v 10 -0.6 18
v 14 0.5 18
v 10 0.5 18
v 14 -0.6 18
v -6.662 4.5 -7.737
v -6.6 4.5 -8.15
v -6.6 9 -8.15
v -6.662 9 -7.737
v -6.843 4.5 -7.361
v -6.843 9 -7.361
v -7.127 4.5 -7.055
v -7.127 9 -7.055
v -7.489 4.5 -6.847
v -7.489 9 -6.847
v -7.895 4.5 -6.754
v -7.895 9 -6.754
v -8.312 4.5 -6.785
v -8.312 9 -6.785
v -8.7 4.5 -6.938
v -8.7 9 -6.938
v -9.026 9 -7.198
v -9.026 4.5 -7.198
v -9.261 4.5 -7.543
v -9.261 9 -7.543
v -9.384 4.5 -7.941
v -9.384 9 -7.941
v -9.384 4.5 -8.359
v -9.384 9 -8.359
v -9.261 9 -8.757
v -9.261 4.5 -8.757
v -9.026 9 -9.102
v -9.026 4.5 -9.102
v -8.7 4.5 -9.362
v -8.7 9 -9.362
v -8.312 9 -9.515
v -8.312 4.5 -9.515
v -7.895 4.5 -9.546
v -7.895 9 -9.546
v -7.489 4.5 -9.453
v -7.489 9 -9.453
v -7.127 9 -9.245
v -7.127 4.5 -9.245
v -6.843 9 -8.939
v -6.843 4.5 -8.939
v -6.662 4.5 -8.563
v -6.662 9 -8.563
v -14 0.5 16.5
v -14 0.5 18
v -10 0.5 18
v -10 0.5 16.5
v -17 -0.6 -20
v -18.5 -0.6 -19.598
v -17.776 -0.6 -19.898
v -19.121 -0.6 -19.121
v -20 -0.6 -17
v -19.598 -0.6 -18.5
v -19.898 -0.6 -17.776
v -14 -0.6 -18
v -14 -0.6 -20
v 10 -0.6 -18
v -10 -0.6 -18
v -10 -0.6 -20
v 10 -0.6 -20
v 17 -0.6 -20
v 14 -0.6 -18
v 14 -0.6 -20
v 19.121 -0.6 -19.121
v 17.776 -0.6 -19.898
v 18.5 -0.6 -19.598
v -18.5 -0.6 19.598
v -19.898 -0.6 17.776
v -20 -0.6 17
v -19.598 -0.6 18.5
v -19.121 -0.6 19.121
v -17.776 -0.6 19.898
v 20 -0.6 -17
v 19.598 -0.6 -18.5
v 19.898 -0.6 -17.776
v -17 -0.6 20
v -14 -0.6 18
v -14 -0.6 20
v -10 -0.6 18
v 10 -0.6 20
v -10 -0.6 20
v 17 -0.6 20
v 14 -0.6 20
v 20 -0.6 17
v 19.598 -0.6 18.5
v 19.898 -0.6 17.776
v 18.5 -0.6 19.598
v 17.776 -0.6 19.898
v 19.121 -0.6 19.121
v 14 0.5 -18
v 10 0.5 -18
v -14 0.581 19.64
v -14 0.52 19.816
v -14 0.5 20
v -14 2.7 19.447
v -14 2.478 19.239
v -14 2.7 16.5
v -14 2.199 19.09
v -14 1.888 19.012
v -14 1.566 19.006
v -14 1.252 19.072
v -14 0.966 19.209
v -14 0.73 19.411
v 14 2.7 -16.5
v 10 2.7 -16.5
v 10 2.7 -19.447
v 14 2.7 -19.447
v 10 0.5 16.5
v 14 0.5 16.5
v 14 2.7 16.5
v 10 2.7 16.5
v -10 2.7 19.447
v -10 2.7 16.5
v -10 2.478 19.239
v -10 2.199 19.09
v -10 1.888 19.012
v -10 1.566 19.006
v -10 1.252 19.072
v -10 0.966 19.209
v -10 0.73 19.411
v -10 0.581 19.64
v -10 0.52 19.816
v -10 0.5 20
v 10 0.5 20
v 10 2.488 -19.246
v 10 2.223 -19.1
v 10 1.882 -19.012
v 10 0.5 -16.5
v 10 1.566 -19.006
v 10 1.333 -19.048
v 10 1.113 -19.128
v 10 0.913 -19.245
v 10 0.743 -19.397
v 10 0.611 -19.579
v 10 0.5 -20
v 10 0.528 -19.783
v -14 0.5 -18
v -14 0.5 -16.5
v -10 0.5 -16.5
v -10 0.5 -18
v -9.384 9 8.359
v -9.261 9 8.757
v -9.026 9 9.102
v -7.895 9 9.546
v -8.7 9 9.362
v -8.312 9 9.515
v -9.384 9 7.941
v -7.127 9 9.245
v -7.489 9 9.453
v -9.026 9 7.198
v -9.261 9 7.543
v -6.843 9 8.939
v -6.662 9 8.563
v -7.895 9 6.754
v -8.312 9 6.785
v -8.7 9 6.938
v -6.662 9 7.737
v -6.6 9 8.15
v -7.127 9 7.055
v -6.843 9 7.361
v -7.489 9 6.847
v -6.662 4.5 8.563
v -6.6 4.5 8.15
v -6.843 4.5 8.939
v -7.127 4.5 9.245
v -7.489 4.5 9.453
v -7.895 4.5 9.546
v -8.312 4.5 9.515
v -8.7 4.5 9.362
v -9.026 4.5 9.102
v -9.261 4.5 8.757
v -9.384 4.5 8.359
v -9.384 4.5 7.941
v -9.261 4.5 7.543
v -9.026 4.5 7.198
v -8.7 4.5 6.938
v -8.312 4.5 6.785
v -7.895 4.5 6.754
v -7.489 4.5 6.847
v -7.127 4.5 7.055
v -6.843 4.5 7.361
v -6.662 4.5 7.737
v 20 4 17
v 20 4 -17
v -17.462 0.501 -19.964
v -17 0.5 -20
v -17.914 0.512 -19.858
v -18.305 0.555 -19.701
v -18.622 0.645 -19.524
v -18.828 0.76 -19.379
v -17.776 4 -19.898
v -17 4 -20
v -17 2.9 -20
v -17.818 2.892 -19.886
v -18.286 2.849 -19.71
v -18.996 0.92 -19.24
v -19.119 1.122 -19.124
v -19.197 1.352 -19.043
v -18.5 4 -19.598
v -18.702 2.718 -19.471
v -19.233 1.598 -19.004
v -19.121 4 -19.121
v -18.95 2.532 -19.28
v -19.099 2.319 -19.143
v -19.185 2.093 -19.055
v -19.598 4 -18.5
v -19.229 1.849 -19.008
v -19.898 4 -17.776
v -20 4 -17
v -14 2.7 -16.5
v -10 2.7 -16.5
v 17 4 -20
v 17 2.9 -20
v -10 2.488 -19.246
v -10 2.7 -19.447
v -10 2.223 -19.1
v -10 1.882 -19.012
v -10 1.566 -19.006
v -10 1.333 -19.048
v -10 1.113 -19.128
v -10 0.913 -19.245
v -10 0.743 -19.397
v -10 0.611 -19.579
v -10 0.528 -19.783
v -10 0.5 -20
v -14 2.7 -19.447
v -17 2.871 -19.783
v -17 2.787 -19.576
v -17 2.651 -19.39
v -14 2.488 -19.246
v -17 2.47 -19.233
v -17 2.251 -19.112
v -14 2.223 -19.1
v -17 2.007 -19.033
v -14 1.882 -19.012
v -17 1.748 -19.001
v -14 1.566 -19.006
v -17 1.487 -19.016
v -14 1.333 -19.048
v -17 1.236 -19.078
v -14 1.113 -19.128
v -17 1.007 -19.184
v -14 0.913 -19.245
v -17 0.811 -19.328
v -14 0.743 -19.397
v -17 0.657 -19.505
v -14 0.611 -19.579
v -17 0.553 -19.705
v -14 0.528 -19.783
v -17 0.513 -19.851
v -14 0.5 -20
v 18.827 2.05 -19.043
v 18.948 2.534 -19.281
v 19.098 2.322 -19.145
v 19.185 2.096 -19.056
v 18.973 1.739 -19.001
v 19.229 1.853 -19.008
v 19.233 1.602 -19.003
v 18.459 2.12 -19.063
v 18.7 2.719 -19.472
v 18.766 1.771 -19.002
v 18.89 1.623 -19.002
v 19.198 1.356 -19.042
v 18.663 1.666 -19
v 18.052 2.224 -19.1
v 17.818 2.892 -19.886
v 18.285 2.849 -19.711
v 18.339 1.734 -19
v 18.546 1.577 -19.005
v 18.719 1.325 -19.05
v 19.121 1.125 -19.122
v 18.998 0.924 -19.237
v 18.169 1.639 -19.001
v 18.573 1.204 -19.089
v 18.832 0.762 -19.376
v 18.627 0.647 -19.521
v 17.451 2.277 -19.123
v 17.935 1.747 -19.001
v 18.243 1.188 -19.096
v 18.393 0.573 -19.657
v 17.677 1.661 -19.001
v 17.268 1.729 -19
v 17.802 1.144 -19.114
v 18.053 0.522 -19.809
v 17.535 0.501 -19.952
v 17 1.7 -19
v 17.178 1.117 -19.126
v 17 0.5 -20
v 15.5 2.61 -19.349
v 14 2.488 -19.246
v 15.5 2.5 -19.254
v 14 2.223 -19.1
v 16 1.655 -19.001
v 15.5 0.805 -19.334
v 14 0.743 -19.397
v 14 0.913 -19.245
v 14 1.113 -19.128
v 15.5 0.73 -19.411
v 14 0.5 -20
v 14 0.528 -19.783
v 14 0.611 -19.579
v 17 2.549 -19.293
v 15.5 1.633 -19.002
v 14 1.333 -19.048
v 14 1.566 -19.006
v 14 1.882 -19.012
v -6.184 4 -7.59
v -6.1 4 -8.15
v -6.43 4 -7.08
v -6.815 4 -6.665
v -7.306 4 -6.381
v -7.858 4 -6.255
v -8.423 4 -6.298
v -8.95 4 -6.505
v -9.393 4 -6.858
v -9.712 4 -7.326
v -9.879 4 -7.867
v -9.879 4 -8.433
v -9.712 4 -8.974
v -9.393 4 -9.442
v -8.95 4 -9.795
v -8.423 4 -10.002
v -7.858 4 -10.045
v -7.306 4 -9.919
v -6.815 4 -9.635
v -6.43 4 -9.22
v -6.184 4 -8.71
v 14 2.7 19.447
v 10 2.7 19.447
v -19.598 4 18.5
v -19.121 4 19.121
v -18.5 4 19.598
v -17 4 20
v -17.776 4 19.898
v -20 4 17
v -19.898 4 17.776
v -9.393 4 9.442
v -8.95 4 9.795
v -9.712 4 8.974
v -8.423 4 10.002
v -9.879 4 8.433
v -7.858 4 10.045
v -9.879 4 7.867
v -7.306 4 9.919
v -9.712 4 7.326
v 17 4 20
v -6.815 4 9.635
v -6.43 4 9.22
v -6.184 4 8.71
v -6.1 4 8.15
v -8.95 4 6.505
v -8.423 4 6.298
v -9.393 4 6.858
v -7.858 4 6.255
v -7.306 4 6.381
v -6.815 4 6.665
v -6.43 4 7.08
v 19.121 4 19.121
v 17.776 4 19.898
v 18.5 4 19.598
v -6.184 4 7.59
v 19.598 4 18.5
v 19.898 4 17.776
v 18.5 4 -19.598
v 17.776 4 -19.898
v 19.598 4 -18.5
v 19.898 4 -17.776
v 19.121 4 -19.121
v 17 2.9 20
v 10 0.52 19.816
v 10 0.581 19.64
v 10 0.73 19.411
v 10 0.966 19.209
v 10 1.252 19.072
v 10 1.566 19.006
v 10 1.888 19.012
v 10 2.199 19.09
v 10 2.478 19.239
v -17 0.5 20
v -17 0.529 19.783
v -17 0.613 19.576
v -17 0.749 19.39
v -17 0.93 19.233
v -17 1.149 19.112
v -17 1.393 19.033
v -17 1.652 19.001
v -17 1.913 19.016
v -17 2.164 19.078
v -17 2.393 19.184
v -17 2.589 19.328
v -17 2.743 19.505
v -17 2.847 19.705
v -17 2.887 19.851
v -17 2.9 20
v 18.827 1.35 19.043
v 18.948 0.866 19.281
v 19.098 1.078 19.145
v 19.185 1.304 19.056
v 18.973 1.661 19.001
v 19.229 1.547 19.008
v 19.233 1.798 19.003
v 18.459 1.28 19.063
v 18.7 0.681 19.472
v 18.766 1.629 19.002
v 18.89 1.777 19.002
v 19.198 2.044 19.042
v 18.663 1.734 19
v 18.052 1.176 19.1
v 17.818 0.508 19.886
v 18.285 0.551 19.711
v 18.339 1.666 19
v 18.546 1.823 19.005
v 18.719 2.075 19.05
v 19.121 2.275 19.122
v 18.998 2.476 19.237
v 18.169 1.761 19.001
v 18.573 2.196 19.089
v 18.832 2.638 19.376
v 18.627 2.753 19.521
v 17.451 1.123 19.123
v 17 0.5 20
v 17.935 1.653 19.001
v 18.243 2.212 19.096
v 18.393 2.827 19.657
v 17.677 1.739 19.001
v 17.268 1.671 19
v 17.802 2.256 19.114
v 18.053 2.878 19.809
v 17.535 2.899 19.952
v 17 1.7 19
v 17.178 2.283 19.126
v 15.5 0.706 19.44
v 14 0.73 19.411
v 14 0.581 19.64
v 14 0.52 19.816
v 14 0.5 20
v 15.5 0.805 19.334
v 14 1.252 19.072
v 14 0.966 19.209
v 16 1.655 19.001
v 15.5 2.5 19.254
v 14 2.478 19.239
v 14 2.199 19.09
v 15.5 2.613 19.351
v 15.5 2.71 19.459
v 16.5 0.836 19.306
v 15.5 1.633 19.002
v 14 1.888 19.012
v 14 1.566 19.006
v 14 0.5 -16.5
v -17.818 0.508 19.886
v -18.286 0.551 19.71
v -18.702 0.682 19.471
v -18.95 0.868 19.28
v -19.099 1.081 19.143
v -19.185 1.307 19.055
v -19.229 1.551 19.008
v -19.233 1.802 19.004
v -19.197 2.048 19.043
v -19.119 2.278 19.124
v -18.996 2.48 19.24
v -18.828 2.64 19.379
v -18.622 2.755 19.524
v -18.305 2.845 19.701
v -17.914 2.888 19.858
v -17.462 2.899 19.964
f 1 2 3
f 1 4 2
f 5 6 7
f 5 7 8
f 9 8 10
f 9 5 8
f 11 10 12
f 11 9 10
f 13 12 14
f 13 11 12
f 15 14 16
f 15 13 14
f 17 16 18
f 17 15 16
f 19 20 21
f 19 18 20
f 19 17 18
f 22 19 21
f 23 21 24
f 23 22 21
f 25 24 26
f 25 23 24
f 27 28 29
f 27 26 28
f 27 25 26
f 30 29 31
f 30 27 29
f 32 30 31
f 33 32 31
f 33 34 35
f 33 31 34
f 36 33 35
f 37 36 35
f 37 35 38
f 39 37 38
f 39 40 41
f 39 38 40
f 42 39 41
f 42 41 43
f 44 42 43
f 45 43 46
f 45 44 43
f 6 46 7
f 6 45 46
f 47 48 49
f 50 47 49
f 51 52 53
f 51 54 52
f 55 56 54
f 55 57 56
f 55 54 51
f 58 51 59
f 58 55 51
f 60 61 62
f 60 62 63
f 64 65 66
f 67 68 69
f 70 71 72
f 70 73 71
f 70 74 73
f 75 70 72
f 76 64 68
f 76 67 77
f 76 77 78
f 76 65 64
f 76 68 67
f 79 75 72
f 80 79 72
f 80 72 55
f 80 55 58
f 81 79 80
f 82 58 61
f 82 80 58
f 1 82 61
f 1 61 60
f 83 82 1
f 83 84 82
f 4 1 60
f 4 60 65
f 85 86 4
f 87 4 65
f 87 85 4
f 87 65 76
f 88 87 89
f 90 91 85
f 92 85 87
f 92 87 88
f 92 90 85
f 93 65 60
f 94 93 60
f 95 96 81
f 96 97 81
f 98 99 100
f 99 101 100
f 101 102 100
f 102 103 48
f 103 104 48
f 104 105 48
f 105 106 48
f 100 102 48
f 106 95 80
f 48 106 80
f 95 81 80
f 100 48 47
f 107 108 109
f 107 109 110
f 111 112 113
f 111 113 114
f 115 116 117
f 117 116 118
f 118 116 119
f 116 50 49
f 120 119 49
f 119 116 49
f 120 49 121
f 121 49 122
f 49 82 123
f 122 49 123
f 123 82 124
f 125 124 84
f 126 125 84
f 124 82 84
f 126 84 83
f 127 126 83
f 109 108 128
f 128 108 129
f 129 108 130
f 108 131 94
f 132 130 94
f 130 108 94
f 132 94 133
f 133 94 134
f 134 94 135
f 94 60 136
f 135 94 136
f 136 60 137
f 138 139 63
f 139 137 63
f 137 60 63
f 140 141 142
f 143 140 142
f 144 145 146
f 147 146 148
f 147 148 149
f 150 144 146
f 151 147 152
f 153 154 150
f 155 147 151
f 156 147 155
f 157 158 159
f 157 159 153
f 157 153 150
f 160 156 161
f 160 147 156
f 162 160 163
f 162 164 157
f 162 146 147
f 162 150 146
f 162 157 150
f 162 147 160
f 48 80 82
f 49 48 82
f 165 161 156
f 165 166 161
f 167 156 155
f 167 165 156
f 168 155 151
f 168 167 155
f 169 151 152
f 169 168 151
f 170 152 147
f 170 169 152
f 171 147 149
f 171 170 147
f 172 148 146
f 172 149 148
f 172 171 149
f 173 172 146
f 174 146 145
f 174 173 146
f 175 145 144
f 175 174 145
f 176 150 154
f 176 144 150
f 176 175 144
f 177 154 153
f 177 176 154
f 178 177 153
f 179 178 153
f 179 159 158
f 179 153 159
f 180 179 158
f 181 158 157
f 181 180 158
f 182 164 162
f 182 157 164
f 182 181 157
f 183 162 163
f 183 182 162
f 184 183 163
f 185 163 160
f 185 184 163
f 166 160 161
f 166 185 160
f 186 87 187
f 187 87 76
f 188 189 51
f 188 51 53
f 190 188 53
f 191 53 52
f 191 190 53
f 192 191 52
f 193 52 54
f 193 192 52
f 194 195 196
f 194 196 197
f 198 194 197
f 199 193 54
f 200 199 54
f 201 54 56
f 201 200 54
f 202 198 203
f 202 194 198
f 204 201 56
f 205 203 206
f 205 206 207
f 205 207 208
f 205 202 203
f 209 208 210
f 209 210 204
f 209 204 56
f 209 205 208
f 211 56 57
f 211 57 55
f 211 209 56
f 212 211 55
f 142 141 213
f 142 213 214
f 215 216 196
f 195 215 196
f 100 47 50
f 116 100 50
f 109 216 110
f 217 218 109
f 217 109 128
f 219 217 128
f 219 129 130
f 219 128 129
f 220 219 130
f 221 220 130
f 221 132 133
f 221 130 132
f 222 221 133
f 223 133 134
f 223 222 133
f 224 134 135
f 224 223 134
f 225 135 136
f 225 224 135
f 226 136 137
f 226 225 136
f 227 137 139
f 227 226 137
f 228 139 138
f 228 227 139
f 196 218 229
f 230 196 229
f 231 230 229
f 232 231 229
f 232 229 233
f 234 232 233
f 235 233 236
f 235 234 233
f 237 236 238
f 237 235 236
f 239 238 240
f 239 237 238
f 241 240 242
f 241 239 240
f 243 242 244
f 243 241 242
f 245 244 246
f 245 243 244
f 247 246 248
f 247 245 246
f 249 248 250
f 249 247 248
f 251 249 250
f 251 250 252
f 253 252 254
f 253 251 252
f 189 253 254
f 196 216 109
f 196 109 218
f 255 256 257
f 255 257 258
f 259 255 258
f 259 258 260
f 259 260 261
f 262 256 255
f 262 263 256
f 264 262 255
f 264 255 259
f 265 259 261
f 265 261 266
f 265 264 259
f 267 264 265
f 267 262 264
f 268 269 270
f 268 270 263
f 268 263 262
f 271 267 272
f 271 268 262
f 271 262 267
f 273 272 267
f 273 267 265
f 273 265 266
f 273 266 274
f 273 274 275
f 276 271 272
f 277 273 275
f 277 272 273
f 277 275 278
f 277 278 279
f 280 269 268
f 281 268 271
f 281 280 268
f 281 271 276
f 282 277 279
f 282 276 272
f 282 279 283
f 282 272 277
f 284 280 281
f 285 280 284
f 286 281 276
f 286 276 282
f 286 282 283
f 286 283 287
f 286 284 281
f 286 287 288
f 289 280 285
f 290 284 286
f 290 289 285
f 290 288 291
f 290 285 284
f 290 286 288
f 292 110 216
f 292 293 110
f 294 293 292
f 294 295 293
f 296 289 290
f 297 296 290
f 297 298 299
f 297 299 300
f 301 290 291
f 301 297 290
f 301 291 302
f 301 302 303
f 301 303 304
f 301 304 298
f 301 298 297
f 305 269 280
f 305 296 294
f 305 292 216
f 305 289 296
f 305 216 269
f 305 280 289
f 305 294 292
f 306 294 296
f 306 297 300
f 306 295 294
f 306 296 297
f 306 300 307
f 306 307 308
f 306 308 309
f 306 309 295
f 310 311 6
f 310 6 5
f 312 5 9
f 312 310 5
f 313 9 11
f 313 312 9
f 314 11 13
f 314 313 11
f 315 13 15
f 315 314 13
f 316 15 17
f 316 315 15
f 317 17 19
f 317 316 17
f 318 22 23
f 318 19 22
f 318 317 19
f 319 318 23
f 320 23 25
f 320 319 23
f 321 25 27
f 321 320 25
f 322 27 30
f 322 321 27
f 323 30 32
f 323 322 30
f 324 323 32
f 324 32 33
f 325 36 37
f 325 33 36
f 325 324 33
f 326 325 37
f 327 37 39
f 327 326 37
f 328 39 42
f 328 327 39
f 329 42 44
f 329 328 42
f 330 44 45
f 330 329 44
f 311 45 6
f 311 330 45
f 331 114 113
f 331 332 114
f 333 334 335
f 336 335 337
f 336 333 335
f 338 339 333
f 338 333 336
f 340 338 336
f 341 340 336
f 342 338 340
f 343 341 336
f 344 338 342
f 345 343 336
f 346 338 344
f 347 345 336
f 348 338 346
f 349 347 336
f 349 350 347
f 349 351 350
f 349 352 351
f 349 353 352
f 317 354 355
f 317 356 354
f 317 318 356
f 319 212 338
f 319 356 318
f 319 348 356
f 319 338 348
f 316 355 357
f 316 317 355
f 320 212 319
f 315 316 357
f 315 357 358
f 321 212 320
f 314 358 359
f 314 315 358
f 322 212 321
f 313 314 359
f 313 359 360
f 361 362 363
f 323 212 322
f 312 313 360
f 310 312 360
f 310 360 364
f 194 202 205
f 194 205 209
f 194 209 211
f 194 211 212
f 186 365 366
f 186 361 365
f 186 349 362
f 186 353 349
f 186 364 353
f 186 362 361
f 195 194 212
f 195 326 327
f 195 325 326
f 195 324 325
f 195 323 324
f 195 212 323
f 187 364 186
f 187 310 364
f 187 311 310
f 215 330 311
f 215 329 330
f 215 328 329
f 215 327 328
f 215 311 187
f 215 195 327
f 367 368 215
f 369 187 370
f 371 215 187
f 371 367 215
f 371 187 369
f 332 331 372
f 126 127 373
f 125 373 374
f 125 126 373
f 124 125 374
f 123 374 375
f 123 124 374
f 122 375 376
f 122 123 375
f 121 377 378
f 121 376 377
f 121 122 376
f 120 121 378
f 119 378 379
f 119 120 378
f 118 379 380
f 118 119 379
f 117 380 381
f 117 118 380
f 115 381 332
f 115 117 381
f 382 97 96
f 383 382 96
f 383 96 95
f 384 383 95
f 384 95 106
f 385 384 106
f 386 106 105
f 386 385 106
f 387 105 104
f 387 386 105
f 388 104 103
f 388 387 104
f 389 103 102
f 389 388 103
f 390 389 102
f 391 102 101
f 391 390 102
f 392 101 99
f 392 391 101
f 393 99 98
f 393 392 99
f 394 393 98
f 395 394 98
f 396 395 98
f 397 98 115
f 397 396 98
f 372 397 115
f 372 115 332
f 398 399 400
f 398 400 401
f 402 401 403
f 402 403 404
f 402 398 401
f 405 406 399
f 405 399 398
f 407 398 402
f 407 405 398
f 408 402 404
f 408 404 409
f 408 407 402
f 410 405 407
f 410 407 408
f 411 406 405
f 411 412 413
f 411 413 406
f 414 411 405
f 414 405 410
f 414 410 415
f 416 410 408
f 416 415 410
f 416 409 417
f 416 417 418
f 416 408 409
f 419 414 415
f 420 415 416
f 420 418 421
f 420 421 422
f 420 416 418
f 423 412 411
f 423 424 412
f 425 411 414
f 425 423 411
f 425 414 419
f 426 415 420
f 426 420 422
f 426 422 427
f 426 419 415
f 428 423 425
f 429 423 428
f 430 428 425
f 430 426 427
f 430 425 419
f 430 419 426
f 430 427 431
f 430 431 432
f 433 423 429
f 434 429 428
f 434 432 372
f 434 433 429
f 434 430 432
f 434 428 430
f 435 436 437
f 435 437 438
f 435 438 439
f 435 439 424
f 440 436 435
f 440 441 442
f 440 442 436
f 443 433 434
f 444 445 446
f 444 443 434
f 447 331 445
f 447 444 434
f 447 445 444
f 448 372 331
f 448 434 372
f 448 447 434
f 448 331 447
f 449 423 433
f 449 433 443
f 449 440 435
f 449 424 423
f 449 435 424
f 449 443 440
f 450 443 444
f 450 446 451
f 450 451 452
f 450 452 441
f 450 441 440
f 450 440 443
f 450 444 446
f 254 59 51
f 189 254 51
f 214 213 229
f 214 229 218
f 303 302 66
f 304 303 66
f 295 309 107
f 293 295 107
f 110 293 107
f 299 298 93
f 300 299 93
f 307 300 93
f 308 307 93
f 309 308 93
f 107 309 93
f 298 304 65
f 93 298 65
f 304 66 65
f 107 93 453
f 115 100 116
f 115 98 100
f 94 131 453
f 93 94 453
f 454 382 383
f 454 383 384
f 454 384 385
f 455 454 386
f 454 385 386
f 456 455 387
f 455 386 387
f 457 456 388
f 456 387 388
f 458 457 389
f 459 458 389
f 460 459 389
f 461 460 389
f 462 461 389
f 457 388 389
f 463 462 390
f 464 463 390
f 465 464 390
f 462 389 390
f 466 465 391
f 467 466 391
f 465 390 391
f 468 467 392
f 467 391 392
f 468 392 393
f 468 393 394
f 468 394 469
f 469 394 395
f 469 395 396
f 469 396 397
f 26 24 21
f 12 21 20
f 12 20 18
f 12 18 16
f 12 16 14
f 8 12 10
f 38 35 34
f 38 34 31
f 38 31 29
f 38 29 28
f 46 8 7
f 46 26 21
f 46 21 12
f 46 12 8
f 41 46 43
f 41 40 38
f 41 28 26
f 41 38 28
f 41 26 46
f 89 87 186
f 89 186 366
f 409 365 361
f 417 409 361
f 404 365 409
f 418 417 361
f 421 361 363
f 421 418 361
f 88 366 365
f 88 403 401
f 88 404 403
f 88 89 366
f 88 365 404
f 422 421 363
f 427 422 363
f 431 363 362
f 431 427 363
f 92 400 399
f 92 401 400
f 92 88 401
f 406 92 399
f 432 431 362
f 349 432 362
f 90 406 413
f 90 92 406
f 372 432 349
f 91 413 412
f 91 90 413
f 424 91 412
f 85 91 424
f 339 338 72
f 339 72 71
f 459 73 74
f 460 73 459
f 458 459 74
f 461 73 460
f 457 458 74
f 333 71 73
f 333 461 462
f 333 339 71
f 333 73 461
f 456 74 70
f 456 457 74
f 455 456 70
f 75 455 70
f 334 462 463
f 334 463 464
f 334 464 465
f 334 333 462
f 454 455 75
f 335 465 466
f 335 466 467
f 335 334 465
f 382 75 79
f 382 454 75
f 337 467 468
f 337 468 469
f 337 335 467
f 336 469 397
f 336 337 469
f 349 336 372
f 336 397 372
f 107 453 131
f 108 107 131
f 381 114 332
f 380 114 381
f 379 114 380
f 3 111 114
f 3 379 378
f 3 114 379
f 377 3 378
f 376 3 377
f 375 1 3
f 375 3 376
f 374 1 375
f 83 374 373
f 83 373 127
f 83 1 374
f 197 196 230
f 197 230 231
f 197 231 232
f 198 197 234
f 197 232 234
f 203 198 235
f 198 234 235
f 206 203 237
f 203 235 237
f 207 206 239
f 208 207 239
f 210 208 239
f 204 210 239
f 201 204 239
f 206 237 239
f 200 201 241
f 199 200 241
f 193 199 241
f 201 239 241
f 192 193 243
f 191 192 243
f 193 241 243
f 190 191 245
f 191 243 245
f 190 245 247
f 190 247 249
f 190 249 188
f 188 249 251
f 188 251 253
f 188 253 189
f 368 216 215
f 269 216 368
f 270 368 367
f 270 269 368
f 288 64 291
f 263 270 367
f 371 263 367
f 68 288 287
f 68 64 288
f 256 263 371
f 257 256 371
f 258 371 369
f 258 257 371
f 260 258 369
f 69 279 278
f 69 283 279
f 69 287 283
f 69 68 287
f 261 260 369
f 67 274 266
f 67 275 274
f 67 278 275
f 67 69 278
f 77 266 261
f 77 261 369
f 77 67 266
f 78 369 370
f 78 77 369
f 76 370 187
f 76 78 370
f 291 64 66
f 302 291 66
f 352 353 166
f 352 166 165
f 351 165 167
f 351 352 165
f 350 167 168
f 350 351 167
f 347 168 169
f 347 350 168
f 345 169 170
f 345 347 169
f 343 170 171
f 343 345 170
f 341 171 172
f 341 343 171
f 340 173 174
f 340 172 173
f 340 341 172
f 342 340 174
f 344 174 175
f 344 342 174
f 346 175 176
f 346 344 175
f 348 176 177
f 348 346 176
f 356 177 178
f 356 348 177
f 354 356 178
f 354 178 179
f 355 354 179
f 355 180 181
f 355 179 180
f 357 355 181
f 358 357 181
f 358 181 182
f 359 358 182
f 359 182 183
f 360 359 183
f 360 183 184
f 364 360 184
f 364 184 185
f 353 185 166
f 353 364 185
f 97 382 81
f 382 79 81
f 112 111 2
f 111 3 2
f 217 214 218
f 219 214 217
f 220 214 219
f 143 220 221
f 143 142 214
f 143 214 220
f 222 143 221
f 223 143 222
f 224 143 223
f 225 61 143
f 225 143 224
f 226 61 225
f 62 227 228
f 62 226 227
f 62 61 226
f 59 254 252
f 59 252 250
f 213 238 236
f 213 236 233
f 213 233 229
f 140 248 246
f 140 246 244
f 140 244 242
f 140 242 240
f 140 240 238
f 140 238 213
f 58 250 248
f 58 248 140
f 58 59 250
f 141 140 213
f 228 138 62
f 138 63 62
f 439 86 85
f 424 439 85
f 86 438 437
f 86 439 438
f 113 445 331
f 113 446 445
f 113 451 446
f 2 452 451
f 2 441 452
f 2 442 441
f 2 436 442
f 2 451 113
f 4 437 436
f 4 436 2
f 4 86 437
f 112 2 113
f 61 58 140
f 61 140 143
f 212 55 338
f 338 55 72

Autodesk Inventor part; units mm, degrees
ref_plane "YZ Plane" through (0, 0, 0) normal (1, 0, 0) x (0, 1, 0)
ref_plane "XZ Plane" through (0, 0, 0) normal (0, 1, 0) x (-1, 0, 0)
sketch "Sketch1" plane through (0, 0, 0) normal (0, 1, 0) x (-1, 0, 0)
  line L0 (20, 20) -> (-20, 20)
  line L1 (-20, 20) -> (-20, -20)
  line L2 (-20, -20) -> (20, -20)
  line L3 (20, -20) -> (20, 20)
  circle A0 centre (10.5, 10.5) radius 4.25
  circle A1 centre (10.5, -10.5) radius 4.25
  circle A2 centre (-10.5, -10.5) radius 4.25
  circle A3 centre (-10.5, 10.5) radius 4.25
  line L4 (20, 0) -> (-20, 0) construction
  line L5 (0, 20) -> (0, -20) construction
  point P0 (0, 0)
  dimension "d0" = 40
  dimension "d1" = 40
  dimension "d2" = 8.5
  dimension "d3" = 21
  dimension "d4" = 21
extrude "Extrusion2" add sketch "Sketch1" along normal blind 2 contours L3 L2 L1 L0 | A0 | A1 | A2 | A3
sketch "Sketch2" plane through (0, 0, 0) normal (0, -1, 0) x (1, 0, 0)
  line L0 (20, 20) -> (20, -20) projected
  line L1 (-20, 20) -> (20, 20) projected
  line L2 (-20, -20) -> (-20, 20) projected
  line L3 (20, -20) -> (-20, -20) projected
  point P0 (0, 0)
extrude "Extrusion3" add sketch "Sketch2" along normal blind 0.6
sketch "Sketch3" plane through (0, 2, 0) normal (0, 1, 0) x (1, 0, 0)
  line L0 (-20, 20) -> (-20, -20) projected
  line L1 (-20, -20) -> (20, -20) projected
  line L2 (20, -20) -> (20, 20) projected
  line L3 (20, 20) -> (-20, 20) projected
  point P0 (0, 0)
extrude "Extrusion4" add sketch "Sketch3" along normal blind 2
fillet "Fillet1" radius 3 4 edges at (-20, 1.7, 20) (-20, 1.7, -20) (20, 1.7, 20) (20, 1.7, -20)
ref_plane "Arbeitsebene1" through (-17, 4, 20) normal (1, 0, 0) x (0, -1, 0)
sketch "Skizze5" plane through (-17, 4, 20) normal (1, 0, 0) x (0, -1, 0)
  line L0 (0, 0) -> (4.6, 0) construction
  line L1 (0, 0) -> (0, 3) construction
  line L2 (0.7, 0) -> (3.5, 0) construction
  line L3 (6.1491, 20) -> (-1.642, 20) construction
  line L4 (0, 40) -> (4.6, 40) construction
  line L5 (0.7, 40) -> (3.5, 40) construction
  line L6 (2.3, 0) -> (2.3, 4.6722) construction
  ellipse E0 centre (2.3, 0) end of major axis (3.5, 0) minor radius 1
  line L7 (1.1, 0) -> (3.5, 0)
  line L8 (0, 40) -> (4.6, 40) construction
  line L9 (0.7, 40) -> (3.5, 40) construction
  ellipse E1 centre (2.3, 40) end of major axis (3.5, 40) minor radius 1
  line L10 (1.1, 40) -> (3.5, 40)
  point P0 (4, 20)
  point P1 (2.3, 1)
  dimension "d22" = 2.3
  dimension "d23" = 1.2
  dimension "d28" = 1
extrude "Extrusion7" cut sketch "Skizze5" along normal blind 37 and the other way blind 5 contours L7 E0 | E1 L10 picked at (2.3176, 0.333) picked at (2.2824, 39.667)
sketch "Skizze6" plane through (0, -0.6, 0) normal (0, -1, 0) x (1, 0, 0)
  line L0 (17, 20) -> (-17, 20) projected
  line L1 (-20, 17) -> (-20, -17) construction
  line L2 (-14, 20) -> (-14, 16.5)
  line L3 (-14, 20) -> (-10, 20)
  line L4 (0, 16.6905) -> (0, 25.5183)
  line L5 (7.2129, 0) -> (-7.9382, 0)
  line L6 (-17, 20) -> (17, 20)
  line L7 (14, 20) -> (10, 20)
  line L8 (17, -20) -> (-17, -20)
  line L9 (-14, 16.5) -> (-10, 16.5)
  line L10 (-10, 16.5) -> (-10, 20)
  line L11 (-17, -20) -> (17, -20) projected
  line L12 (14, 20) -> (14, 16.5)
  line L13 (14, 16.5) -> (10, 16.5)
  line L14 (10, 16.5) -> (10, 20)
  line L15 (-14, -20) -> (-14, -16.5)
  line L16 (-14, -16.5) -> (-10, -16.5)
  line L17 (-10, -16.5) -> (-10, -20)
  line L18 (10, -16.5) -> (10, -20)
  line L19 (14, -16.5) -> (10, -16.5)
  line L20 (14, -20) -> (14, -16.5)
  point P0 (0, 0)
  point P1 (-12, 20)
  dimension "d34" = 8
  dimension "d35" = 2
  dimension "d41" = 3.5
  dimension "d42" = 4
extrude "Extrusion8" cut sketch "Skizze6" against normal blind 3.3
sketch "Skizze8" plane through (0, -0.6, 0) normal (0, -1, 0) x (1, 0, 0)
  line L0 (-10, 20) -> (-10, 16.5) projected
  line L1 (-10, 16.5) -> (-14, 16.5) projected
  line L2 (-14, -20) -> (-14, -16.5) projected
  line L3 (-14, -16.5) -> (-10, -16.5) projected
  line L4 (-10, -16.5) -> (-10, -20) projected
  line L5 (-10, -20) -> (10, -20) projected
  line L6 (10, -20) -> (10, -16.5) projected
  line L7 (10, -16.5) -> (14, -16.5) projected
  line L8 (14, -16.5) -> (14, -20) projected
  line L9 (14, -20) -> (17, -20) projected
  arc A0 (17, -20) -> (20, -17) centre (17, -17) ccw projected
  line L10 (20, -17) -> (20, 17) projected
  arc A1 (20, 17) -> (17, 20) centre (17, 17) ccw projected
  line L11 (17, 20) -> (14, 20) projected
  line L12 (14, 20) -> (14, 16.5) projected
  line L13 (14, 16.5) -> (10, 16.5) projected
  line L14 (10, 16.5) -> (10, 20) projected
  line L15 (10, 20) -> (-10, 20) projected
  line L16 (-10, 20) -> (-10, 16.5) projected
  line L17 (-10, 16.5) -> (-14, 16.5) projected
  line L18 (-14, 16.5) -> (-14, 20) projected
  line L19 (-14, 20) -> (-17, 20) projected
  arc A2 (-17, 20) -> (-20, 17) centre (-17, 17) ccw projected
  line L20 (-20, 17) -> (-20, -17) projected
  arc A3 (-20, -17) -> (-17, -20) centre (-17, -17) ccw projected
  line L21 (-17, -20) -> (-14, -20) projected
  line L22 (0, 16.7549) -> (0, 9.0333)
  line L23 (12, 0) -> (-14, 0)
  line L24 (-10, 16.5) -> (-14, 16.5)
  line L25 (-14, 16.5) -> (-14, 18)
  line L26 (-14, 18) -> (-10, 18)
  line L27 (-10, 18) -> (-10, 16.5)
  line L28 (10, 20) -> (10, 16.5)
  line L29 (10, 16.5) -> (14, 16.5)
  line L30 (14, 16.5) -> (14, 18)
  line L31 (14, 18) -> (10, 18)
  line L32 (10, 18) -> (10, 16.5)
  line L33 (-14, -18) -> (-10, -18)
  line L34 (14, -18) -> (10, -18)
  point P0 (0, 0)
  dimension "d47" = 1.5
extrude "Extrusion10" add sketch "Skizze8" against normal blind 1.1 contours L0 L1 L18 L26 | L31 L12 L13 L14 | L2 L3 L4 L33 | L34 L6 L7 L8
sketch "Skizze9" plane through (0, 4, 0) normal (0, 1, 0) x (1, 0, 0)
  line L0 (-20, 17) -> (-20, -17) projected
  circle A0 centre (-8, -8.15) radius 1.4
  line L1 (-2.4635, 0) -> (-12.5282, 0) construction
  circle A1 centre (-8, 8.15) radius 1.4
  point P0 (0, 0)
  dimension "d55" = 8.15
  dimension "d56" = 12
  dimension "d57" = 2.8
extrude "Extrusion11" add sketch "Skizze9" along normal blind 5
chamfer "Fasen2" distance 0.5 angle 45 2 edges at (-9.4, 4, -8.15) (-9.4, 4, 8.15)
properties part number "IMU_mount_baseplate"
